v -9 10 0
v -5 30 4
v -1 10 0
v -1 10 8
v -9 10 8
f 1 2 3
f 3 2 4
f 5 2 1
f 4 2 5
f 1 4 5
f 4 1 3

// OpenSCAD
// four-sided pyramid (horizontal)

showPoints=false; // true works for F5 Preview only; must set to false for F6 Render.

pyramid_base=8;
pyramid_half_base=pyramid_base/2;
pyramid_height=30;
pyramid_vertical_offset=10;

polyPoints = [
  [pyramid_half_base, pyramid_vertical_offset, 0], // 0 bottom-right
  [-pyramid_half_base, pyramid_vertical_offset, 0], // 1 bottom-left
  [0, pyramid_height, pyramid_half_base], // 2 apex
  [pyramid_half_base, pyramid_vertical_offset, pyramid_base], // 3 top-right
  [-pyramid_half_base, pyramid_vertical_offset, pyramid_base] // 4 top-left
];
polyFaces = [
  [0,2,1], // bottom
  [3,2,0], // right
  [1,2,4], // left
  [4,2,3], // top
  [3,0,1,4] // back
];

translate([-5,0,0]) {
  polyhedron(polyPoints, polyFaces);
  if (showPoints) {
    color("yellow") {
      for (idx = [ 0 : len(polyPoints) - 1 ] ) {
        echo("polyPoints", idx, polyPoints[idx]);
        translate(polyPoints[idx]) rotate([90,0,0]) linear_extrude(height=0.2) text(text=str(idx), size=2);
      }
    }
  }
}
